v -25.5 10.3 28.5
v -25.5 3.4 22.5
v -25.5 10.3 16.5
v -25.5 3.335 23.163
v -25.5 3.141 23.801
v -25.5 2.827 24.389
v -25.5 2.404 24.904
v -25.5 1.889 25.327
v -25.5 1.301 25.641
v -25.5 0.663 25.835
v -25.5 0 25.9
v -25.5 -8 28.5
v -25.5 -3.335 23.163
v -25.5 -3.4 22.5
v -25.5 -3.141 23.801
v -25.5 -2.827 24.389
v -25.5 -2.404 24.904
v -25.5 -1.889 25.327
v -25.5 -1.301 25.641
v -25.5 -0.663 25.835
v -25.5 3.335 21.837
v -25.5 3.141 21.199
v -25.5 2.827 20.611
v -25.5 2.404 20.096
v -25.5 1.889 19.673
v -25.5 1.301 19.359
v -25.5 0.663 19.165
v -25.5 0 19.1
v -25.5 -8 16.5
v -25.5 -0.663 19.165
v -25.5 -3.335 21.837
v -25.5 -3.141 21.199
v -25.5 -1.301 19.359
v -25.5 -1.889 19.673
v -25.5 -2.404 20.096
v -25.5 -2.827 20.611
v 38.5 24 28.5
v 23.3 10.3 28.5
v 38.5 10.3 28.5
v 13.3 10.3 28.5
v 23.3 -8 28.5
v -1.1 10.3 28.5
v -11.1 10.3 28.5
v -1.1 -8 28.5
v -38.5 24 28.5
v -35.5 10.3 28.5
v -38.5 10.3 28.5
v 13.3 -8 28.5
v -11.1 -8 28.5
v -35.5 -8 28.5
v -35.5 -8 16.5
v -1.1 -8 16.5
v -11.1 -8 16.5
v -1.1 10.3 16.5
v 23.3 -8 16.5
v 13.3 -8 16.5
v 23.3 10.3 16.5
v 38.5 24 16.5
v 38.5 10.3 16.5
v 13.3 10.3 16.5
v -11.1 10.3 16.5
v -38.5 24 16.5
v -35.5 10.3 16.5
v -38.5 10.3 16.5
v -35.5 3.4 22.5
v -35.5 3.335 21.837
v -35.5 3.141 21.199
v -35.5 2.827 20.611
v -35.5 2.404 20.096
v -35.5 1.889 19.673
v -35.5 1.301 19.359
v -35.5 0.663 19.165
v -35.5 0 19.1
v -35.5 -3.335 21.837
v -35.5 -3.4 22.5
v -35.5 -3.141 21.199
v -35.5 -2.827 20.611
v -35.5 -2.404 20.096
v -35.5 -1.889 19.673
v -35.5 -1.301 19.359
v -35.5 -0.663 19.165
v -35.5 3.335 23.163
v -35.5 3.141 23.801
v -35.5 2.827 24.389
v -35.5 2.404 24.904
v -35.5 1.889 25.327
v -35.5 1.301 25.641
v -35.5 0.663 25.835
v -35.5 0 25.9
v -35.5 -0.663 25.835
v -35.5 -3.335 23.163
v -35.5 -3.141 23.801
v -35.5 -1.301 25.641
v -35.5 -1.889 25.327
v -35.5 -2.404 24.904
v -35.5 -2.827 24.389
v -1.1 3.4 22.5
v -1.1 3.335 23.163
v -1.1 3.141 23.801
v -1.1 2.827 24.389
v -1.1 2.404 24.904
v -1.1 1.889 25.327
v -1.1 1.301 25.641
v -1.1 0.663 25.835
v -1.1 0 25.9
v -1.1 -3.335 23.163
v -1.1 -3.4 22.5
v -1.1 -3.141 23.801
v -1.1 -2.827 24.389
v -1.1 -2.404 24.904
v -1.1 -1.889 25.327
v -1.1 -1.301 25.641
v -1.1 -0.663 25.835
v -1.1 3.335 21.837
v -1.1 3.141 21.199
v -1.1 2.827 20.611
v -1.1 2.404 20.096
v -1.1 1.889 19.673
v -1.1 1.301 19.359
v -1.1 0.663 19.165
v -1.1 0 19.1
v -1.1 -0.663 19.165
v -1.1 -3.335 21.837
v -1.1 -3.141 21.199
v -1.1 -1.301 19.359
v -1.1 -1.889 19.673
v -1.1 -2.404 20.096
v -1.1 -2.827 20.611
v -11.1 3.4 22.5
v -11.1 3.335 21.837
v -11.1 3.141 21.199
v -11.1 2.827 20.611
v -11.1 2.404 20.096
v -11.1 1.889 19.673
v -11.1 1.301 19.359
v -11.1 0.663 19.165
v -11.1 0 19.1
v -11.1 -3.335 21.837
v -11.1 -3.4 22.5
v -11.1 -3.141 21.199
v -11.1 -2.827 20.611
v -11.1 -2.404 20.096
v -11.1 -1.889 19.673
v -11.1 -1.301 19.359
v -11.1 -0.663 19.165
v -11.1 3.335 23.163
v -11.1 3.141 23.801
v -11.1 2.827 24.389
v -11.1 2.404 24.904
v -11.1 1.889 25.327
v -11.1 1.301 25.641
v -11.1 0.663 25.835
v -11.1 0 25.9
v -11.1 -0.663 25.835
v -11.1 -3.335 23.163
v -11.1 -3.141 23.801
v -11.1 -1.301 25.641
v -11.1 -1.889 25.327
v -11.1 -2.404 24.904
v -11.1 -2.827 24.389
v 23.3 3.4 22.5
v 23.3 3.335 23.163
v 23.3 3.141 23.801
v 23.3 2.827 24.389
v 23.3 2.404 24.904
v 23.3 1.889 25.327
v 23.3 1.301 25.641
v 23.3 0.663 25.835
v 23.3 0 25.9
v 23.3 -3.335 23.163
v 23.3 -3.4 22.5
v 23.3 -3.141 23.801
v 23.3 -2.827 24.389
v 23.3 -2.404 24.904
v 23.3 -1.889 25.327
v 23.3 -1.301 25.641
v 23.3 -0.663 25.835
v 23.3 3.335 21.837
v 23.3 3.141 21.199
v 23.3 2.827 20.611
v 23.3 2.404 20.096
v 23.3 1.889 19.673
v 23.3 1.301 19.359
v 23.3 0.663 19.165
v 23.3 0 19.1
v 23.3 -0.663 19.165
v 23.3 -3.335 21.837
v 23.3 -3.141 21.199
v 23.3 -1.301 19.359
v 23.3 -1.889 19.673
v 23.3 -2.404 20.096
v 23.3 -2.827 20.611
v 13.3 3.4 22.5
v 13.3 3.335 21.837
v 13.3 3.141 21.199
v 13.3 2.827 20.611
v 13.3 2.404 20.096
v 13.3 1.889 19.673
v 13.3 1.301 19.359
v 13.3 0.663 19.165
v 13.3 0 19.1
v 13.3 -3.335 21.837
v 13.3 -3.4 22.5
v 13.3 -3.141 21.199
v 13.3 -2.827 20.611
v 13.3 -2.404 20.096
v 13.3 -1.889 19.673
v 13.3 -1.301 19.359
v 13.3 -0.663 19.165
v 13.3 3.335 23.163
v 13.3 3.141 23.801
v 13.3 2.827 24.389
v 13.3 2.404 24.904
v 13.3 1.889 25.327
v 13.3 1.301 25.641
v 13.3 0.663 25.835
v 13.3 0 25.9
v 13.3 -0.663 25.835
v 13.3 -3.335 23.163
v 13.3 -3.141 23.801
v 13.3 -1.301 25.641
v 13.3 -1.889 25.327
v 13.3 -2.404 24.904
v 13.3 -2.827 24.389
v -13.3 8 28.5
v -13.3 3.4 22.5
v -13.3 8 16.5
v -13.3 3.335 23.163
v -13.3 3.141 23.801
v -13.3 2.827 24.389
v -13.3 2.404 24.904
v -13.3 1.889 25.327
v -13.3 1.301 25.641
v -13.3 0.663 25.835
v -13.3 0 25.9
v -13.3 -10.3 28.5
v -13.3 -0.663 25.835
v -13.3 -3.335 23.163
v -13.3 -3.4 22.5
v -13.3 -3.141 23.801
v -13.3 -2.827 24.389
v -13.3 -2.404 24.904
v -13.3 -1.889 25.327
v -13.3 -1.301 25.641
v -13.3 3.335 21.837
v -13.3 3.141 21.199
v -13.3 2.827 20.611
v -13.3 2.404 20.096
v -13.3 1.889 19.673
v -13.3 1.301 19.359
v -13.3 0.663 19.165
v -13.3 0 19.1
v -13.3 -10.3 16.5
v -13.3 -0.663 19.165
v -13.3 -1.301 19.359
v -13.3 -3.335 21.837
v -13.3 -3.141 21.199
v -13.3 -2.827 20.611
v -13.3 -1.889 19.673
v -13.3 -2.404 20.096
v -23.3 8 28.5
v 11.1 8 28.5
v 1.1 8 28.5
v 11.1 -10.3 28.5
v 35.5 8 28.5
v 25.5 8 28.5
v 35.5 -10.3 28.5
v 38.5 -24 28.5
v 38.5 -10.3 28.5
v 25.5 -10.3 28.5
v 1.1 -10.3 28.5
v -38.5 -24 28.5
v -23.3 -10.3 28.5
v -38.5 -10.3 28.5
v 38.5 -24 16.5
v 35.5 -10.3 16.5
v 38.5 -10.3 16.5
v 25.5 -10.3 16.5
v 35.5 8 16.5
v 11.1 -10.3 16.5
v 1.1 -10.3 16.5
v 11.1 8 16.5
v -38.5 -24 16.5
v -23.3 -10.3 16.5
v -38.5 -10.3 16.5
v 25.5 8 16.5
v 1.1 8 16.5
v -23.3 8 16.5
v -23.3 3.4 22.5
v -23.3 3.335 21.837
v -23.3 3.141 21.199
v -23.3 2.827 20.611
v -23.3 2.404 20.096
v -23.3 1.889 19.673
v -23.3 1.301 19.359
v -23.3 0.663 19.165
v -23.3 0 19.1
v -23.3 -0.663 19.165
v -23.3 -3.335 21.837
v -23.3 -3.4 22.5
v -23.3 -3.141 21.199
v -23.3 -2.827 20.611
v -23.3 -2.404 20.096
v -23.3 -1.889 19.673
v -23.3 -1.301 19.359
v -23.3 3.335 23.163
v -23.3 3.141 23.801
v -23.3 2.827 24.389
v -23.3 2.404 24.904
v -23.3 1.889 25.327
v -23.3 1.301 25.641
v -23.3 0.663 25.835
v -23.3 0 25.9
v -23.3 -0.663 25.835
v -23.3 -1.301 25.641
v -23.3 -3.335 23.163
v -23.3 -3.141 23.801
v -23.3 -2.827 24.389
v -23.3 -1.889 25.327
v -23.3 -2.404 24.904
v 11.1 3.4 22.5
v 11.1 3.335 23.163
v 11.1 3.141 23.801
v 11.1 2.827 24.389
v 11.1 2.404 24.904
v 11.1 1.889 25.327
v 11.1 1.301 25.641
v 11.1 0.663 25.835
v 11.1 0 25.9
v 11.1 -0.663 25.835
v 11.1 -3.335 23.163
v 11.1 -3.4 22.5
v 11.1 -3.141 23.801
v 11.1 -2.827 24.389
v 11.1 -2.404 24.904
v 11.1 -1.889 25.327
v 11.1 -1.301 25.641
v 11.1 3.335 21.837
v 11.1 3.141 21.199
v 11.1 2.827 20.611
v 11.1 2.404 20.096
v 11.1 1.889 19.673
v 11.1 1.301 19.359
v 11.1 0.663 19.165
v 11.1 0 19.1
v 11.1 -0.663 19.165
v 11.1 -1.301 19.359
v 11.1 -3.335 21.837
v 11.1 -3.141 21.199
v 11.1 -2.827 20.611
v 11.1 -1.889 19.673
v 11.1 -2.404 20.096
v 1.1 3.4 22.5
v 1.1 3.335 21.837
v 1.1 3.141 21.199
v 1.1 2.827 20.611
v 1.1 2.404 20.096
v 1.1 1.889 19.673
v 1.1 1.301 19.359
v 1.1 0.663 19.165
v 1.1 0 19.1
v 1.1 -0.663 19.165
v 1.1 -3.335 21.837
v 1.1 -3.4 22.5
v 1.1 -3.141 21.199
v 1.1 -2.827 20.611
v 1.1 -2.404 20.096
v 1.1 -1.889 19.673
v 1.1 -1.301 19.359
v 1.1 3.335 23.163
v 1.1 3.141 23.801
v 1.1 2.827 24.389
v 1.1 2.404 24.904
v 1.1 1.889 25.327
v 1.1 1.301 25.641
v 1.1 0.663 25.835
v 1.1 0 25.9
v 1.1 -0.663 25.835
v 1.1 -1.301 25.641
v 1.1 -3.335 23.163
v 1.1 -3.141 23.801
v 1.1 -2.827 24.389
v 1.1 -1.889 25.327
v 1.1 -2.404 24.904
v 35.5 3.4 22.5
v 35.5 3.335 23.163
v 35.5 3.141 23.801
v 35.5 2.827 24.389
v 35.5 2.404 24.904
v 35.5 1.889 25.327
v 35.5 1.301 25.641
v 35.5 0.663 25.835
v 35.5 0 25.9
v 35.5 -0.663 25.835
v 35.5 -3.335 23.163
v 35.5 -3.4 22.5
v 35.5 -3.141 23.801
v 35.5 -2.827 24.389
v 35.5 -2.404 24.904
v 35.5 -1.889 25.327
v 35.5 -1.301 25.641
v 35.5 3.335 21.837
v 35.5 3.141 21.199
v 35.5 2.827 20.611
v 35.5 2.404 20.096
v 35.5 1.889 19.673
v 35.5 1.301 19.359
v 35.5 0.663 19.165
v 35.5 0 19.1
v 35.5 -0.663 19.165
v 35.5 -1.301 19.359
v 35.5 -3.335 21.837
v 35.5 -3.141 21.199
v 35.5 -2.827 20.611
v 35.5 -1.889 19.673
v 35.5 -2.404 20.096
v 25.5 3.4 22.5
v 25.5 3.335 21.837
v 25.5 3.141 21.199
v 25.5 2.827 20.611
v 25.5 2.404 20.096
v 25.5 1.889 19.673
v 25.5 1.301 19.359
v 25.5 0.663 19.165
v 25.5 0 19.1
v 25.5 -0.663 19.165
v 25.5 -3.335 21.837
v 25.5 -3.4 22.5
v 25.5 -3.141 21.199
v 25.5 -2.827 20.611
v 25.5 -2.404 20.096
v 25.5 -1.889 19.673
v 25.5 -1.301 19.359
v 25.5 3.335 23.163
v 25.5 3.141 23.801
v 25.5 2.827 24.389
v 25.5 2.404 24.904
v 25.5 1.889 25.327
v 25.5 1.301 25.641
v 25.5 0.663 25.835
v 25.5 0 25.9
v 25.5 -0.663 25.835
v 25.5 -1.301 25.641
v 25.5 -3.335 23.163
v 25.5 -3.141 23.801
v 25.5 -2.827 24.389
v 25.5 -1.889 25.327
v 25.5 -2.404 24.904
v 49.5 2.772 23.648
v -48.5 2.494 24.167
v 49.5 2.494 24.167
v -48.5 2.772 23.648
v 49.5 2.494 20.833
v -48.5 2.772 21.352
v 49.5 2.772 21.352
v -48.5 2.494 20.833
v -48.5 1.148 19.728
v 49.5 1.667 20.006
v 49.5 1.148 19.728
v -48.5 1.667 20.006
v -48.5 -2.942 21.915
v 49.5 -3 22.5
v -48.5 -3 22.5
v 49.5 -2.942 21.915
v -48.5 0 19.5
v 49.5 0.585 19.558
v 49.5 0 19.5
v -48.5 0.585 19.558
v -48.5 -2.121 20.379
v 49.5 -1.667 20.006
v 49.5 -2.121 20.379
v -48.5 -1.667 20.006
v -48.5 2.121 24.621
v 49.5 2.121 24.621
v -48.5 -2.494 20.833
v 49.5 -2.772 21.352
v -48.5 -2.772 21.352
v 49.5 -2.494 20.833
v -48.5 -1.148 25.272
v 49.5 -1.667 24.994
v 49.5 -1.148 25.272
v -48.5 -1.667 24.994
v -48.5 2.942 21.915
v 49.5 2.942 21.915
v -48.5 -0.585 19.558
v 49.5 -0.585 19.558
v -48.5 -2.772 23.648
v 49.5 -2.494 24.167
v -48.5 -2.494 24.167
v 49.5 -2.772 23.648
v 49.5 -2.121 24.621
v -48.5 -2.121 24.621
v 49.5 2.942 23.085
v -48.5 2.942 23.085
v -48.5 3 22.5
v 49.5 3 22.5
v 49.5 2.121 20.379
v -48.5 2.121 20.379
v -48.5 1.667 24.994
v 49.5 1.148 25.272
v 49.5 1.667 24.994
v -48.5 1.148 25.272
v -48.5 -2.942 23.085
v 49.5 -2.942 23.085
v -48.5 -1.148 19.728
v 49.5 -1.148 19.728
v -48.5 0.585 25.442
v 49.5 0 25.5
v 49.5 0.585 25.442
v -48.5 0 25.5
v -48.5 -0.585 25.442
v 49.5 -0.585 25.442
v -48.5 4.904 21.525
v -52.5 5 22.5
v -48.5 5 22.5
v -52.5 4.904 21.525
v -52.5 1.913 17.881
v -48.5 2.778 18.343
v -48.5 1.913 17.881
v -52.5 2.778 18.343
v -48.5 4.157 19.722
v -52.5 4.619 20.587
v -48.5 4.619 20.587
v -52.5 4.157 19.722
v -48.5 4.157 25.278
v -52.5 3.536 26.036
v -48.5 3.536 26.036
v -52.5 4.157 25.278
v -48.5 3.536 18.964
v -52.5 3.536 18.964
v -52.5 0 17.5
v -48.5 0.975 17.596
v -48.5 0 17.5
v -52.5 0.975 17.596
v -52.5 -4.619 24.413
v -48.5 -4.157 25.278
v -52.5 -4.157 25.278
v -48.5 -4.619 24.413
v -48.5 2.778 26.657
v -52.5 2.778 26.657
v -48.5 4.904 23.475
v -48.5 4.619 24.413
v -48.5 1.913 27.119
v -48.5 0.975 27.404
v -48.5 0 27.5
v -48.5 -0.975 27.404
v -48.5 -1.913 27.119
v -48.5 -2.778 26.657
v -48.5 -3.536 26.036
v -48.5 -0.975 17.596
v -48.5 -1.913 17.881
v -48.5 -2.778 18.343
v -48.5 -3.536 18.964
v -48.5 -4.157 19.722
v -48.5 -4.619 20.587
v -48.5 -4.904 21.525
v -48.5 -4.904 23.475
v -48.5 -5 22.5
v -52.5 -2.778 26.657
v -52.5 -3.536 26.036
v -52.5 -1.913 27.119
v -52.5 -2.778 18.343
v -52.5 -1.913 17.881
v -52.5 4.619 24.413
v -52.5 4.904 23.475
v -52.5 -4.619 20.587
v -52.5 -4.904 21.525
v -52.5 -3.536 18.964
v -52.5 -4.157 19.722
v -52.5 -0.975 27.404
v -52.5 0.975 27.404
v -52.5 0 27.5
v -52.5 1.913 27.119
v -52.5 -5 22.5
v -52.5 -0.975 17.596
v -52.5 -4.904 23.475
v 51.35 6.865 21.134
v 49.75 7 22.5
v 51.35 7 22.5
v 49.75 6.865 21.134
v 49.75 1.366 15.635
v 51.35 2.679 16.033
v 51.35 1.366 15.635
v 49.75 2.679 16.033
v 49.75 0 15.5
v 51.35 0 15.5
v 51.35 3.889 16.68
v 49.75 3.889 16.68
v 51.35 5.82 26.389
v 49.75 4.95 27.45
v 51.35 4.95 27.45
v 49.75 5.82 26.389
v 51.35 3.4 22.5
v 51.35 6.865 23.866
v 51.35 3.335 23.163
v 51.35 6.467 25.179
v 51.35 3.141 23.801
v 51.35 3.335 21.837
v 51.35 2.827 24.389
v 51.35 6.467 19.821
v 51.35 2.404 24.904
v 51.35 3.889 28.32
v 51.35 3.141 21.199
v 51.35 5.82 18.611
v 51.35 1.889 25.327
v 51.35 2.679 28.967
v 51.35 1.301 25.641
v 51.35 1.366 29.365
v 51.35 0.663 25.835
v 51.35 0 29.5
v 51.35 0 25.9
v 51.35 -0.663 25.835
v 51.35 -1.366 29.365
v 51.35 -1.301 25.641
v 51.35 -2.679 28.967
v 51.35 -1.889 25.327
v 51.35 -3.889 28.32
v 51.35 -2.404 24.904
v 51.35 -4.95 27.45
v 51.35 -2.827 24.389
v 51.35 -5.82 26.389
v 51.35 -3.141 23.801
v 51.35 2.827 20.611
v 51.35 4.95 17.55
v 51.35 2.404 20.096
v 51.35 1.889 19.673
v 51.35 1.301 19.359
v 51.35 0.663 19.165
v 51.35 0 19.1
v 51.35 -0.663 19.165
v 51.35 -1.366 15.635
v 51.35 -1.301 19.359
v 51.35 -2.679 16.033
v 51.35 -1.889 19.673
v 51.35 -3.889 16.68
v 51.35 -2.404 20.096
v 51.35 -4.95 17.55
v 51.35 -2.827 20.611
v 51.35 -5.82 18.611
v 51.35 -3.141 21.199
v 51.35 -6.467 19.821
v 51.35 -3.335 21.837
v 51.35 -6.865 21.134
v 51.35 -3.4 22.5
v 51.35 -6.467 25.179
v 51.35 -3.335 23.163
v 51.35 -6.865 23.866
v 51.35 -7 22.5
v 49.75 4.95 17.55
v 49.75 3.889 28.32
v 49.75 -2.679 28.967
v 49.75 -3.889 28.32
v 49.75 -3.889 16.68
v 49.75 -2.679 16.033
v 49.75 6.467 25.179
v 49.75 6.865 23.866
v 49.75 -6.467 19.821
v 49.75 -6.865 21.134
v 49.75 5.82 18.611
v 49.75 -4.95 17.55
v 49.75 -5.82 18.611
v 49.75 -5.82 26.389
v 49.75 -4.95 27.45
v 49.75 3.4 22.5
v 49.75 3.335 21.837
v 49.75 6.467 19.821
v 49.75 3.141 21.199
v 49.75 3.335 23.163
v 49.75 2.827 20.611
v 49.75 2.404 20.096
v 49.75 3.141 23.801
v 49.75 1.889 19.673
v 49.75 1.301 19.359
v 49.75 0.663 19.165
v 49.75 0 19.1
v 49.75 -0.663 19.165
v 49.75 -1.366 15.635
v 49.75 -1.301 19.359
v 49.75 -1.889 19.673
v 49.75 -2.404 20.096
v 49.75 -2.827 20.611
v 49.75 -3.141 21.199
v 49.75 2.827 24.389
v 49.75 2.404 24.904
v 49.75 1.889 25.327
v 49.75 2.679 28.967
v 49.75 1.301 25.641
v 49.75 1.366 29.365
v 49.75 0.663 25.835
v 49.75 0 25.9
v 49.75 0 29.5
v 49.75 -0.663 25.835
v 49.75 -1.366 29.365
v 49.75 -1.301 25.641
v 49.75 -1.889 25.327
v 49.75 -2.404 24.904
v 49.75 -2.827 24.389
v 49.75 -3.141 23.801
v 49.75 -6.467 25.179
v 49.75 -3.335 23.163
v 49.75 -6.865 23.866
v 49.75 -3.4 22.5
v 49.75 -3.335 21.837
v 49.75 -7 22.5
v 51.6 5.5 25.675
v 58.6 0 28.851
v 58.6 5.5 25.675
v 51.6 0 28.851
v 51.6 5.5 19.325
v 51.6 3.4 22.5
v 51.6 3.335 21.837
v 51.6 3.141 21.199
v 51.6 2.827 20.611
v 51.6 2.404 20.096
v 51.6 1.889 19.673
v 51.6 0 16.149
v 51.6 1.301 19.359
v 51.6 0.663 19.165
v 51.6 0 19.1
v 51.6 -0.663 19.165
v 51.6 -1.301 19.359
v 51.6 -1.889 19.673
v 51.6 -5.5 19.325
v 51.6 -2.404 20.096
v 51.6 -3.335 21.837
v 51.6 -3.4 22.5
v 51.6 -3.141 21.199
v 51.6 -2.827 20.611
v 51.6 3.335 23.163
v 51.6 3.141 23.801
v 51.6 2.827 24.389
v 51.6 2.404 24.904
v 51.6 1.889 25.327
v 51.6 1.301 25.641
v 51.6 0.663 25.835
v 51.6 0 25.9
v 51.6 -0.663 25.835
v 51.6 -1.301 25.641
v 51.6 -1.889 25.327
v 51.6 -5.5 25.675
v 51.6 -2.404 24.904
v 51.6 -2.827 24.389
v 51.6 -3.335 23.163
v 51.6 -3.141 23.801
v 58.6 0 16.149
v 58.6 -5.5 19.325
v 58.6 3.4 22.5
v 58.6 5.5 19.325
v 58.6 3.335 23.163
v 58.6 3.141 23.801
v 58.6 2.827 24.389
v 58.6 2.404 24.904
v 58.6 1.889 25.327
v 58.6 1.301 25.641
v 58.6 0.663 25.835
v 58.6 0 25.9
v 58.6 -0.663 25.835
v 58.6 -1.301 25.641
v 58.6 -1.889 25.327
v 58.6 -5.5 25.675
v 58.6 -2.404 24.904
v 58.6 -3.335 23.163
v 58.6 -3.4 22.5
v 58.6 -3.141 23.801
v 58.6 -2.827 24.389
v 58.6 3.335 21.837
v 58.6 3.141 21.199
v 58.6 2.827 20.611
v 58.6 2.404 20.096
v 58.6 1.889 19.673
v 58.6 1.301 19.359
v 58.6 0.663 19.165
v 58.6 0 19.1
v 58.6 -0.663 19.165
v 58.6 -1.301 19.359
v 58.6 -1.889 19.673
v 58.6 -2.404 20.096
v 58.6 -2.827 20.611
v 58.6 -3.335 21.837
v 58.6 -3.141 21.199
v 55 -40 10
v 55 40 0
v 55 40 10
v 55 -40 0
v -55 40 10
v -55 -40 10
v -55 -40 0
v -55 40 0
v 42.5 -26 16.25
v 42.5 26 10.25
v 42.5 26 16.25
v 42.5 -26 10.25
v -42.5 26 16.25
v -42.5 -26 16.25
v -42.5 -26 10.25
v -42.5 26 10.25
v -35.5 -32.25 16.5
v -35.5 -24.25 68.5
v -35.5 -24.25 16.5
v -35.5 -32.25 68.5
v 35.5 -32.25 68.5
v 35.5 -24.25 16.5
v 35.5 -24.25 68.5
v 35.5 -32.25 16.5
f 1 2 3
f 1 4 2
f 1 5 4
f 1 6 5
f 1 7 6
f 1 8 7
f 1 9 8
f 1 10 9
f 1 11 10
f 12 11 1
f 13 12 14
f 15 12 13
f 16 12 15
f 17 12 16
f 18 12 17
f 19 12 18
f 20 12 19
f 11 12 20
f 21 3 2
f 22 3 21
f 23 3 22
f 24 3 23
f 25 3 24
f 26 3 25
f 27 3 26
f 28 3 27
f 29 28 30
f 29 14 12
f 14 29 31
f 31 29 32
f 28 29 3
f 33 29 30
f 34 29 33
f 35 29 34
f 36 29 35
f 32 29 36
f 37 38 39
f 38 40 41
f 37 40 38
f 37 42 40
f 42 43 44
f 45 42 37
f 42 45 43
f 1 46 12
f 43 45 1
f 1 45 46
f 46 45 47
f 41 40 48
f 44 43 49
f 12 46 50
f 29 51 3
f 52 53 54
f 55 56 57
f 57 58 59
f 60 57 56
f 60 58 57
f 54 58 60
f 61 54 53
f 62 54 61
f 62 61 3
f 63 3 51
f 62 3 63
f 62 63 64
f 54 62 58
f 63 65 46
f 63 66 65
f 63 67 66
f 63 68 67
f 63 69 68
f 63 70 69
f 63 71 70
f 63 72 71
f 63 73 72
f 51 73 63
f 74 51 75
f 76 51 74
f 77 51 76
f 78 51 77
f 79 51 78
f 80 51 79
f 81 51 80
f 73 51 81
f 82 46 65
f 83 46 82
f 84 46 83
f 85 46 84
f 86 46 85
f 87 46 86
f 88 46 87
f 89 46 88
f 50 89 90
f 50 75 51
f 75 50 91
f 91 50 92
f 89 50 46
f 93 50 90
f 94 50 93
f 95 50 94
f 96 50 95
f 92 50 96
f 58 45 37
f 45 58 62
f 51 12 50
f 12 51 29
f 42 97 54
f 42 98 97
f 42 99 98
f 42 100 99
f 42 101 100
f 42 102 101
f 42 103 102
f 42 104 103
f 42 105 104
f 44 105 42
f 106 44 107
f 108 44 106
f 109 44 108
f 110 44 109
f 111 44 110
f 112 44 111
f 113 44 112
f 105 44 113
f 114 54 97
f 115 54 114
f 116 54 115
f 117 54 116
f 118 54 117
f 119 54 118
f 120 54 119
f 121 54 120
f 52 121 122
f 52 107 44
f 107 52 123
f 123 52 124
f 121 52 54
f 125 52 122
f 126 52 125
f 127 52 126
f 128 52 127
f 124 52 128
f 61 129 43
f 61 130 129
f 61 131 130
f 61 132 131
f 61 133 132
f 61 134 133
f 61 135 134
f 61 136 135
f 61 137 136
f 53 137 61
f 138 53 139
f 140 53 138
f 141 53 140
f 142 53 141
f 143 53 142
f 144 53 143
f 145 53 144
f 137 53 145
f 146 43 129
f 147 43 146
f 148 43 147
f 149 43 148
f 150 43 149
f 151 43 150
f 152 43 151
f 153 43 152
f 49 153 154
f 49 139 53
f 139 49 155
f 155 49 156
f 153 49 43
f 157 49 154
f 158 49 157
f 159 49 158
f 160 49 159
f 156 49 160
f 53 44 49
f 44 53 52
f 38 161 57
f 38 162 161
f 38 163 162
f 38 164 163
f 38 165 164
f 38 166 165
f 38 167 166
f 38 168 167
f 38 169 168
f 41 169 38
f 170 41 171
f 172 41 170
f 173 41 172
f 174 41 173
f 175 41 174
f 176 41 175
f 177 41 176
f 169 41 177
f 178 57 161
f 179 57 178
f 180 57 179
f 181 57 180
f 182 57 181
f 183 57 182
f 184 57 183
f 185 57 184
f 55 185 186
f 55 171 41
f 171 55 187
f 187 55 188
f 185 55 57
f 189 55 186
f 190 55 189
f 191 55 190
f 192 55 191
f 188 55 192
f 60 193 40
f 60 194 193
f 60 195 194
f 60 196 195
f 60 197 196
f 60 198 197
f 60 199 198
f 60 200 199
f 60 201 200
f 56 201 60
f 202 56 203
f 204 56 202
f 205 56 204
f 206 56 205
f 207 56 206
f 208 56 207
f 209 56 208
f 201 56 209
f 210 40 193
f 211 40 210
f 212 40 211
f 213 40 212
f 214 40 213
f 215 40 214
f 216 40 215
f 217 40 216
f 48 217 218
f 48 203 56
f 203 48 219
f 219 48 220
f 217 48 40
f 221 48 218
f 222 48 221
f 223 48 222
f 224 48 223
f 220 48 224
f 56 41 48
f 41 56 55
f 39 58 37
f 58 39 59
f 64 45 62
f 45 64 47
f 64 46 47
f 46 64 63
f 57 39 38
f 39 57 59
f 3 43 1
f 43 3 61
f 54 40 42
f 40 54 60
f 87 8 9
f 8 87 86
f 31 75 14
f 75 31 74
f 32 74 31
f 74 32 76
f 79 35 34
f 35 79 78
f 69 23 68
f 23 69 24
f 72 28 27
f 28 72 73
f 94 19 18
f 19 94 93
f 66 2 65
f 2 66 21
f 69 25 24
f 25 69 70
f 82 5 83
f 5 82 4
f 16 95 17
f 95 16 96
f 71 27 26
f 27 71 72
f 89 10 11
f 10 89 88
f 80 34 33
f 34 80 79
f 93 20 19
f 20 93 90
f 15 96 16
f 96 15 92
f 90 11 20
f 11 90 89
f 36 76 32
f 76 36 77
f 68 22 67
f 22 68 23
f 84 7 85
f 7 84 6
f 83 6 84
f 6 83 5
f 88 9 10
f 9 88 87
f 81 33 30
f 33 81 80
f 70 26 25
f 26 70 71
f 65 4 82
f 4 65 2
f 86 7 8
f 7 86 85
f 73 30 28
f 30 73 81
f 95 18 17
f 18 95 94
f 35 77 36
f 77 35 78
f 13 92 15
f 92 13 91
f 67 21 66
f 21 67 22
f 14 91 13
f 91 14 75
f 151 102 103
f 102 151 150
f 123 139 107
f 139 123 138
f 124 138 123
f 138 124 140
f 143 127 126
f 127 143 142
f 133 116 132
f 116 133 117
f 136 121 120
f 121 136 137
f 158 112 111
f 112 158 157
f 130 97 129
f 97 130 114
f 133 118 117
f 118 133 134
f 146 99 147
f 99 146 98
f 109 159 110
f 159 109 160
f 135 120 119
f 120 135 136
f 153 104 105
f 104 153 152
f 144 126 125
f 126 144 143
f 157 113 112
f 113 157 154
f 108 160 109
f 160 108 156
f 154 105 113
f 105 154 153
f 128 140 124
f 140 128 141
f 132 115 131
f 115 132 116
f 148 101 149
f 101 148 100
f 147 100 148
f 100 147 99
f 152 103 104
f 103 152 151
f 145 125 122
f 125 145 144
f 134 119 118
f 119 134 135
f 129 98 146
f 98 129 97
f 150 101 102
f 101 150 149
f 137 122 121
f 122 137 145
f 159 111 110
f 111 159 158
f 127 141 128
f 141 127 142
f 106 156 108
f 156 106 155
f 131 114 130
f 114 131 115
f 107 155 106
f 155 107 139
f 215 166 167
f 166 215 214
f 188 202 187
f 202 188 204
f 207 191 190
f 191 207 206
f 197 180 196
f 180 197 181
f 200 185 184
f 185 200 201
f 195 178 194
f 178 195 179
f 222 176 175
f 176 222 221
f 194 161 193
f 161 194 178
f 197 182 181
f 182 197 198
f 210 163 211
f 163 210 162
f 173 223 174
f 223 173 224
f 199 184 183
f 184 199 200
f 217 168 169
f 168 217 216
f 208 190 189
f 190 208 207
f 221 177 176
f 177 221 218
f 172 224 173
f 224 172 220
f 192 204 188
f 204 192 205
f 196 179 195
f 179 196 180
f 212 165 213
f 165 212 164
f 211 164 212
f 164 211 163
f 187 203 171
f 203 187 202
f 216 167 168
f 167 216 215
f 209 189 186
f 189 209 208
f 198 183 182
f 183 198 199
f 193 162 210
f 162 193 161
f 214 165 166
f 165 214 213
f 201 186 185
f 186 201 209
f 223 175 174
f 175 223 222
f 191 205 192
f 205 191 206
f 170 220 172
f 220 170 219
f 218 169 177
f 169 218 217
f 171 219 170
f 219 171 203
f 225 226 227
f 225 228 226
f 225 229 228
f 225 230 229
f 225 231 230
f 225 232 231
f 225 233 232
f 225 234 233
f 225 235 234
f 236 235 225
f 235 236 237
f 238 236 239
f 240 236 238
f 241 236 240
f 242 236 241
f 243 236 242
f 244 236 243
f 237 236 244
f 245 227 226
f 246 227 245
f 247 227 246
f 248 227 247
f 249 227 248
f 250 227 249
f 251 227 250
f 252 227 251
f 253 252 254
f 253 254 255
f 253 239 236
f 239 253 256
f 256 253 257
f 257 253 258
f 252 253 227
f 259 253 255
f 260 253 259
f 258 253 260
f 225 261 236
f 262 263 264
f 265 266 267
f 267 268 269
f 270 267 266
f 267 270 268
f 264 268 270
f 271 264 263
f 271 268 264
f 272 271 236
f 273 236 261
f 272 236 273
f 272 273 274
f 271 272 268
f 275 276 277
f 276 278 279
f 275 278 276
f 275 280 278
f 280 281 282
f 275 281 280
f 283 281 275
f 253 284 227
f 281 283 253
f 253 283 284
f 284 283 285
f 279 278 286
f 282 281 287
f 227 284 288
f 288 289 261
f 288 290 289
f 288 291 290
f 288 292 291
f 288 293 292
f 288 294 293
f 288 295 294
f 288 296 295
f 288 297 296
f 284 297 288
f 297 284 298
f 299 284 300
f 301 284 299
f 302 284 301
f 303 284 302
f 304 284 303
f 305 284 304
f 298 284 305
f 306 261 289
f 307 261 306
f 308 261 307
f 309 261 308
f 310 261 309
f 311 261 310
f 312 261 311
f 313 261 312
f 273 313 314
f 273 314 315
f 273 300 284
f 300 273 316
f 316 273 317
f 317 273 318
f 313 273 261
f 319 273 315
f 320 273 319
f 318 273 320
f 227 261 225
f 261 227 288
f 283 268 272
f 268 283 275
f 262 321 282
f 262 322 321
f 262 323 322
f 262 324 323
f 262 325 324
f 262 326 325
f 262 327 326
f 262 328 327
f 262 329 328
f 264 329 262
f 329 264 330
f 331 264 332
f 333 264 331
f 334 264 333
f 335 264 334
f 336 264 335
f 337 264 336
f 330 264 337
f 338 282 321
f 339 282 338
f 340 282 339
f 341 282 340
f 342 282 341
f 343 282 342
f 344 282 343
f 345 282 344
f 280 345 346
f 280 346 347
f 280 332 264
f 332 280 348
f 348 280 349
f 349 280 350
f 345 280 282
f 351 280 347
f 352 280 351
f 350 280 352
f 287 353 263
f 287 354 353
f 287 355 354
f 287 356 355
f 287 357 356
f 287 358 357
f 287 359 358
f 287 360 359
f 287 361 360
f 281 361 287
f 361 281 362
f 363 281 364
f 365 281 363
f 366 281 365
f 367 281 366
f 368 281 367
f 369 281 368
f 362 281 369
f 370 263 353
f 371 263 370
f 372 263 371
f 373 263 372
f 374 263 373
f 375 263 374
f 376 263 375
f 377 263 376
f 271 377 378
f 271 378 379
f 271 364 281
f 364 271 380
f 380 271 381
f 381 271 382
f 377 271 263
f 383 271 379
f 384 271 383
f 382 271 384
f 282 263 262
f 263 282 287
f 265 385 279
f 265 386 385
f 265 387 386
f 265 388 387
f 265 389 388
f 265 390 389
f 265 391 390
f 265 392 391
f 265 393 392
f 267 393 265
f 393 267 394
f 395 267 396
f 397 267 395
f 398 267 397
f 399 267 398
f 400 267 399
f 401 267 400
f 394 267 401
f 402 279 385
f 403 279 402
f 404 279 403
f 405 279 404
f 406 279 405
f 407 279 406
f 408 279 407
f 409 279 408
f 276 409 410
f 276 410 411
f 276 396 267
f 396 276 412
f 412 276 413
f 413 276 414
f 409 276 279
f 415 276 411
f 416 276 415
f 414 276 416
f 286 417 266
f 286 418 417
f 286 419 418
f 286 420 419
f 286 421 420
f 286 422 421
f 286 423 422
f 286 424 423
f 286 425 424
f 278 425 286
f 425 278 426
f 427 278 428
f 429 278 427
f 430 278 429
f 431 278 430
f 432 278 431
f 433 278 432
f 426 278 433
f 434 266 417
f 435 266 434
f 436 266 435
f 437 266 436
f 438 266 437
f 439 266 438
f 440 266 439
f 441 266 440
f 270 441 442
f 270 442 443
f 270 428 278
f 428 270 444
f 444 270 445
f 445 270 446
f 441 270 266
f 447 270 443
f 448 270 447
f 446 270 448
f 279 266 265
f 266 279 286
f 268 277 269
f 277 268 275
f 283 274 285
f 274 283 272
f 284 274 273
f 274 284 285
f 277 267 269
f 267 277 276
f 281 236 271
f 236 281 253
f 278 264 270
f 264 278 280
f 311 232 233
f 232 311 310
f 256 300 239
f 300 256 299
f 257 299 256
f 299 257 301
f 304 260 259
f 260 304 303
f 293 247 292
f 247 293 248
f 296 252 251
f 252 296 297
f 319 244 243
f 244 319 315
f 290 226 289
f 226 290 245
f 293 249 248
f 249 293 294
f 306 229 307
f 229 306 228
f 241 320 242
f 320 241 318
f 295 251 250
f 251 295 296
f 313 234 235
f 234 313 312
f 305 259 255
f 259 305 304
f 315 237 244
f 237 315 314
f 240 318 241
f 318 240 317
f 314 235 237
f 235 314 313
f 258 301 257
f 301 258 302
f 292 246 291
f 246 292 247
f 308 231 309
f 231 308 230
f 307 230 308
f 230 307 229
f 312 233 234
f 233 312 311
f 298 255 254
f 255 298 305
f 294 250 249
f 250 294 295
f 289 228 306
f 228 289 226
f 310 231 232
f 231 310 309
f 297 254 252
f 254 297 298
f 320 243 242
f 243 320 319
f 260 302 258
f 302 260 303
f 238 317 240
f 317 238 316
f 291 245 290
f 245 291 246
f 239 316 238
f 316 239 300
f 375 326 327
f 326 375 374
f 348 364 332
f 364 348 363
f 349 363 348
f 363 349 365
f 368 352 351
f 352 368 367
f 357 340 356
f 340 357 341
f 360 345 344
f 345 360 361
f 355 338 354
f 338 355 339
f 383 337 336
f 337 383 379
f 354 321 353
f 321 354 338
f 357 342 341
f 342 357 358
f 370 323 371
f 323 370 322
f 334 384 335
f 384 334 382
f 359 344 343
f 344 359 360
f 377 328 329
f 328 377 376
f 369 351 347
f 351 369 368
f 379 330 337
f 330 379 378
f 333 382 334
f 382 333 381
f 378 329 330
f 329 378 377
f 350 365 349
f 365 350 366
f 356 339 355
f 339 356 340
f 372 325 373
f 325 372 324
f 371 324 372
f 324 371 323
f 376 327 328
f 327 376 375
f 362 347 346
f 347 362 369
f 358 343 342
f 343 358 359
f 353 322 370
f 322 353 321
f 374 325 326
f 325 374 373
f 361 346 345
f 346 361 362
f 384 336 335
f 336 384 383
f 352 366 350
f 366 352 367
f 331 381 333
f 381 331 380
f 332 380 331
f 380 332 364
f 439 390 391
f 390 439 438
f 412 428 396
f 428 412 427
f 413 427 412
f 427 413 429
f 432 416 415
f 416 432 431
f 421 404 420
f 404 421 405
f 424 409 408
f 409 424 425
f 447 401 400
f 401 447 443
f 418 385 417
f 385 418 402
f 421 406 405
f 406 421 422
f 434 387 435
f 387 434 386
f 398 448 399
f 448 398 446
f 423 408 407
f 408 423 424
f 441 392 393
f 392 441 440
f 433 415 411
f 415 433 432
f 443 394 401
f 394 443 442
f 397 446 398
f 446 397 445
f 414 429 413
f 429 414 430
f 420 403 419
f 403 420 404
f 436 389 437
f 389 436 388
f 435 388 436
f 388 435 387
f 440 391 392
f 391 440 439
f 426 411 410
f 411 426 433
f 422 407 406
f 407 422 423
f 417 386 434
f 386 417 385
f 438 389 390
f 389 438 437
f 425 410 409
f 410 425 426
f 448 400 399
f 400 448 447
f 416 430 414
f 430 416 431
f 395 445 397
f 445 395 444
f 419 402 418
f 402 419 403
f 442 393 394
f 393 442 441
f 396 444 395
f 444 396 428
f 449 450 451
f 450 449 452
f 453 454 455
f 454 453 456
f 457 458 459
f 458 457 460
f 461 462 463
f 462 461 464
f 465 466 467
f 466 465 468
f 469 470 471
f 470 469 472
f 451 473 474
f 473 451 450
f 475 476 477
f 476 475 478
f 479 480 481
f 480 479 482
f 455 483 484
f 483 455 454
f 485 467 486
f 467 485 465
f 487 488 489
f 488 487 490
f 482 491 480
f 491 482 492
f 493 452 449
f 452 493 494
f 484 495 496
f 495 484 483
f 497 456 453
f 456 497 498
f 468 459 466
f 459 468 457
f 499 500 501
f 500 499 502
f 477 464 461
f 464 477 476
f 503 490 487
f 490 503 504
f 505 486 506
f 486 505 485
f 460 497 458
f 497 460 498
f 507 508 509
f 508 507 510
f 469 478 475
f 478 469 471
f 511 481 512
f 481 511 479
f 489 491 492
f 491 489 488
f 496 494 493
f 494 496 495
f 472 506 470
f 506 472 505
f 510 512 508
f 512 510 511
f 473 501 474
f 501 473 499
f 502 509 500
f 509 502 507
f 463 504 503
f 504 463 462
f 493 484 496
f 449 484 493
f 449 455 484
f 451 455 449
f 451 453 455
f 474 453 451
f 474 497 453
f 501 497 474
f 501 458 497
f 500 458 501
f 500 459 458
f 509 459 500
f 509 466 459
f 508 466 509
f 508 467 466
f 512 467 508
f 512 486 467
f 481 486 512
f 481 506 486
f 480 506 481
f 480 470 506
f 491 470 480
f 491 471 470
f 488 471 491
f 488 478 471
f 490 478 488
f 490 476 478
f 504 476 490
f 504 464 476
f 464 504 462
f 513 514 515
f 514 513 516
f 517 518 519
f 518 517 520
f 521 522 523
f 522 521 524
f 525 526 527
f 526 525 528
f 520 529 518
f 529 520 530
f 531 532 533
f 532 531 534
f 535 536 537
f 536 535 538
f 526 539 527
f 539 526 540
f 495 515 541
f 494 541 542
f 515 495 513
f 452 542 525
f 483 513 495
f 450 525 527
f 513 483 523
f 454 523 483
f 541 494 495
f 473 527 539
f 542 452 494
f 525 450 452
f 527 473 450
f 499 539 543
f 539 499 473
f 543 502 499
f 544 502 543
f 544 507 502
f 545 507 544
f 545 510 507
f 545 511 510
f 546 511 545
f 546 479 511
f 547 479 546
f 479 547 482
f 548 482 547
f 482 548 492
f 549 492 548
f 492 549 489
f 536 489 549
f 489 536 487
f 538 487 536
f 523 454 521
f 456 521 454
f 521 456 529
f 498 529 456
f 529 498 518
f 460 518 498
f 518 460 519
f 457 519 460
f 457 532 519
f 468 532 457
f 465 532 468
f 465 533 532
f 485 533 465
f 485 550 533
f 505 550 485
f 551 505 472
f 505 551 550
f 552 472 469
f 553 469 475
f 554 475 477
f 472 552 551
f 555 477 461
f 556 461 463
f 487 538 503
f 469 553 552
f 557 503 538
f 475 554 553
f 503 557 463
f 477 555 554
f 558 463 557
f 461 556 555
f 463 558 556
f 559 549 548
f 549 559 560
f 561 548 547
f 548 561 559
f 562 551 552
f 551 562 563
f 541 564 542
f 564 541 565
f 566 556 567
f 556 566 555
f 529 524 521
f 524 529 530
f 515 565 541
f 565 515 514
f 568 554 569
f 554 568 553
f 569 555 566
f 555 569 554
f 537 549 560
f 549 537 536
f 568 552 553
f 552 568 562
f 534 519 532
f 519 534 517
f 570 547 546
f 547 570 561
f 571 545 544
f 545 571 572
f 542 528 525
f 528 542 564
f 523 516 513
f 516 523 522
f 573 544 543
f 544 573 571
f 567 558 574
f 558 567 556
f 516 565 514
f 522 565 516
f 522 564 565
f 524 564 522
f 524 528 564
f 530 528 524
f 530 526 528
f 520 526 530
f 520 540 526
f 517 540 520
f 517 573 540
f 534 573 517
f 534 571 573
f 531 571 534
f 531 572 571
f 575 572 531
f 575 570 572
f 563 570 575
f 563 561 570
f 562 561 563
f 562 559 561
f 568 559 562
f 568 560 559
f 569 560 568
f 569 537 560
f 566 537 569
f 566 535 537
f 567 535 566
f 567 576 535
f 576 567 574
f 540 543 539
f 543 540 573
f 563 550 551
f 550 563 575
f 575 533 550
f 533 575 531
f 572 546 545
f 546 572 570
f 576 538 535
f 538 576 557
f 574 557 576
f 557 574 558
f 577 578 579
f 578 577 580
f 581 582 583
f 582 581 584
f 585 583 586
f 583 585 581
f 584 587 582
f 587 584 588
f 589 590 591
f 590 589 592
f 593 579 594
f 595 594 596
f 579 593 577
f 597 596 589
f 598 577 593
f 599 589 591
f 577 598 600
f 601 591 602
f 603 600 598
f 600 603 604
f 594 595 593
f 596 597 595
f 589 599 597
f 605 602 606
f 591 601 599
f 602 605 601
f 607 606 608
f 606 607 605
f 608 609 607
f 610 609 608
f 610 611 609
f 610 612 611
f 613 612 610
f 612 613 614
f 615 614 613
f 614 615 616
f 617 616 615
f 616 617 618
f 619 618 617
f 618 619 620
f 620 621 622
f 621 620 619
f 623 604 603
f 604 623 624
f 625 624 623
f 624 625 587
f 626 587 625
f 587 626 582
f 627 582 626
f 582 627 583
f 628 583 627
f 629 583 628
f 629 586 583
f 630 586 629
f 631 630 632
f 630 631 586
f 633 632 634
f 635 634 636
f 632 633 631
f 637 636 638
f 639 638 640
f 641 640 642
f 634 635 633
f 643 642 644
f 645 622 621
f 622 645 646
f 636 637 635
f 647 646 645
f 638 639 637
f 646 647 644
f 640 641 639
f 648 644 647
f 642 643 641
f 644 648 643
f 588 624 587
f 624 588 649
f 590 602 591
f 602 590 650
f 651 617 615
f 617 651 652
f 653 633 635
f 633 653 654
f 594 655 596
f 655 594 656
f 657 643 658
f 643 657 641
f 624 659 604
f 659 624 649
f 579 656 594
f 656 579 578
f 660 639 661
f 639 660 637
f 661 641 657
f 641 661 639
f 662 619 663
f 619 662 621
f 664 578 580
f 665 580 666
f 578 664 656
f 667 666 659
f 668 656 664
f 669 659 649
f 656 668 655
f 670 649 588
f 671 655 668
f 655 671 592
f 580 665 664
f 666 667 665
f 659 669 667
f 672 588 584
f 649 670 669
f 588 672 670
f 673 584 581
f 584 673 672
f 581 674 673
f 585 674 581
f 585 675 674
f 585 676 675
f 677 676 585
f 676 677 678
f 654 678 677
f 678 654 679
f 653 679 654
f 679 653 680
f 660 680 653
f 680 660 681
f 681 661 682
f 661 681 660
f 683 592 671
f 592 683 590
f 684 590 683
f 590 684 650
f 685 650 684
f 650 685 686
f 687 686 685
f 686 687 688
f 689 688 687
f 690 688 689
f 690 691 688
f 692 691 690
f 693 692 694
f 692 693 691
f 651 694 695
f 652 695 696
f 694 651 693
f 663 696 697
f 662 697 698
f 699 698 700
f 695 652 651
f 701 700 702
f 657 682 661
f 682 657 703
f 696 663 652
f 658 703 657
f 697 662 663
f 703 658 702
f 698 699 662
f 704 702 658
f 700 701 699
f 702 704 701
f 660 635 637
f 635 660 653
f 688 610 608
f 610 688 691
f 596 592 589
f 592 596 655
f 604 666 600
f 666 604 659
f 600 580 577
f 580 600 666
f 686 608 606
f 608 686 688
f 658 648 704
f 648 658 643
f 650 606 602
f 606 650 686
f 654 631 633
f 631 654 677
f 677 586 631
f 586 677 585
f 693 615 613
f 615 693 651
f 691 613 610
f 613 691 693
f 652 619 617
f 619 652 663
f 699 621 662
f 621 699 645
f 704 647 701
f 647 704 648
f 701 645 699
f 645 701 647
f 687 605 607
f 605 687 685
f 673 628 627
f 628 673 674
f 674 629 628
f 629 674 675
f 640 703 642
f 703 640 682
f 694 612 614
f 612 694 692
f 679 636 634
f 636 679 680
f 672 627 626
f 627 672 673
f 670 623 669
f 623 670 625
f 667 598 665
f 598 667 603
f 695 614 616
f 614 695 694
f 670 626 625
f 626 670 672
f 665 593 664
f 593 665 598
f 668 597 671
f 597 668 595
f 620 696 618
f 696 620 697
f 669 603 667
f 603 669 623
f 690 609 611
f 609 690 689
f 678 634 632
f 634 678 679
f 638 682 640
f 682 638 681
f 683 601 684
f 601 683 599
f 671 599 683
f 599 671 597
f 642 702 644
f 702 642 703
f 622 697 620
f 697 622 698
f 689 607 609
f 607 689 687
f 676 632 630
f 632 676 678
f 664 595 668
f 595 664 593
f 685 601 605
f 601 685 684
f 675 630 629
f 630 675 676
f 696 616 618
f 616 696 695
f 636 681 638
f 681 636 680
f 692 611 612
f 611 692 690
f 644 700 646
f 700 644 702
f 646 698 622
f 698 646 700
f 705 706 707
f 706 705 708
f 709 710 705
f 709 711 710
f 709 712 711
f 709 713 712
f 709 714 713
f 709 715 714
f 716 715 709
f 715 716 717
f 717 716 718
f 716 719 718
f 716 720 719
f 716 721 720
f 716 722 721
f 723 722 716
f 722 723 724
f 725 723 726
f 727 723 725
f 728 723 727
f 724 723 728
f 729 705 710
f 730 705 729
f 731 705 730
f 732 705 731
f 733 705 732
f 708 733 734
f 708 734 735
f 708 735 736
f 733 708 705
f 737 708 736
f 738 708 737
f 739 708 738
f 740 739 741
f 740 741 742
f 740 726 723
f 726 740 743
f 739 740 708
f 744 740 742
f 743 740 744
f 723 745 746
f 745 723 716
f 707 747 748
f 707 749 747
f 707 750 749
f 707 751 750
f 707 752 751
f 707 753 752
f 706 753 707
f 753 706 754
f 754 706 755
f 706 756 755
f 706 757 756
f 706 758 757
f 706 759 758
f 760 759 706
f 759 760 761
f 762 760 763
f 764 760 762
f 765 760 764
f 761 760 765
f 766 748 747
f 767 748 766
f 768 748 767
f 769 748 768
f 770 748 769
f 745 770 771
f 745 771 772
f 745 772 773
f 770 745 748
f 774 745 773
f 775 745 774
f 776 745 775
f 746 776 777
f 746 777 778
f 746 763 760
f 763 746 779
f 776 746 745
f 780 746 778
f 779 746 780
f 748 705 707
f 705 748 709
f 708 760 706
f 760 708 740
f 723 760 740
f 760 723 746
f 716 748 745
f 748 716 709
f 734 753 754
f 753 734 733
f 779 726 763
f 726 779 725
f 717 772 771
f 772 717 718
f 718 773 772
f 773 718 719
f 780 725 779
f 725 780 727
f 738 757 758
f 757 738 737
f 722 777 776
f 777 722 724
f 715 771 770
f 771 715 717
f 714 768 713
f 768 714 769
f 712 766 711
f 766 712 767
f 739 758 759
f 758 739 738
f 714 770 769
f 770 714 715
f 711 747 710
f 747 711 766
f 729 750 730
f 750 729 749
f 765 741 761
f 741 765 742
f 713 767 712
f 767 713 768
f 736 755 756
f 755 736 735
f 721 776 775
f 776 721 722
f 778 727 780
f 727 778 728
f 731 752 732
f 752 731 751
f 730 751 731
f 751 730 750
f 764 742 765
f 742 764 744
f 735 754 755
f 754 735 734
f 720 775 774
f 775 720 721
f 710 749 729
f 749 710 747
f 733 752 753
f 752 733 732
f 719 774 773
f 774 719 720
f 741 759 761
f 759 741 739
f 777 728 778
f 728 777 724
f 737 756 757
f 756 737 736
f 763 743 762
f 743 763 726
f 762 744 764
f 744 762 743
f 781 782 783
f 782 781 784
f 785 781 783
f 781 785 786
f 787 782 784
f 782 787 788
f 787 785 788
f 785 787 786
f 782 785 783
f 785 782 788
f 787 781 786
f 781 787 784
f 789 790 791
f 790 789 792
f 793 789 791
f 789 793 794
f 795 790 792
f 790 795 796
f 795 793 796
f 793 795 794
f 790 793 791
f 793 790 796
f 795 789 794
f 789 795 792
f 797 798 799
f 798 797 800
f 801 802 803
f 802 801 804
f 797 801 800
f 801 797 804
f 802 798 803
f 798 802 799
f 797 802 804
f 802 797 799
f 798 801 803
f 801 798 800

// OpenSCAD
$fn = 32;

// ------------------------------------------------------------------------
// Comb hinge with flap: leaf 77 x 24 mm, pin d6, flap 52 mm
// Every part is its own module, assembly() places every instance.
// ------------------------------------------------------------------------

// --- part 1 ---
module hinge_bed() {
  difference() {
    translate([-55, -40, 0]) cube([110, 80, 10]);
  }
}

// --- part 2 ---
module hinge_riser() {
  difference() {
    translate([-42.5, -26, 0]) cube([85, 52, 6]);
  }
}

// --- part 3 ---
module hinge_leaf_a() {
  difference() {
    union() {
      translate([-35.5, -8, -6]) cube([10, 32, 12]);
      translate([-11.1, -8, -6]) cube([10, 32, 12]);
      translate([13.3, -8, -6]) cube([10, 32, 12]);
      translate([-38.5, 10.3, -6]) cube([77, 13.7, 12]);
    }
    translate([-30.5, 0, 0]) rotate([0, 90, 0]) cylinder(h = 12, d = 6.8, center = true);
    translate([-6.1, 0, 0]) rotate([0, 90, 0]) cylinder(h = 12, d = 6.8, center = true);
    translate([18.3, 0, 0]) rotate([0, 90, 0]) cylinder(h = 12, d = 6.8, center = true);
  }
}

// --- part 4 ---
module hinge_leaf_b() {
  difference() {
    union() {
      translate([-23.3, -24, -6]) cube([10, 32, 12]);
      translate([1.1, -24, -6]) cube([10, 32, 12]);
      translate([25.5, -24, -6]) cube([10, 32, 12]);
      translate([-38.5, -24, -6]) cube([77, 13.7, 12]);
    }
    translate([-18.3, 0, 0]) rotate([0, 90, 0]) cylinder(h = 12, d = 6.8, center = true);
    translate([6.1, 0, 0]) rotate([0, 90, 0]) cylinder(h = 12, d = 6.8, center = true);
    translate([30.5, 0, 0]) rotate([0, 90, 0]) cylinder(h = 12, d = 6.8, center = true);
  }
}

// --- part 5 ---
module hinge_flap() {
  difference() {
    translate([-35.5, -26, 0]) cube([71, 52, 8]);
  }
}

// --- part 6 ---
module hinge_pin() {
  rotate([0, 90, 0]) cylinder(h = 99, d = 6, center = true);
  translate([-52.5, 0, 0]) rotate([0, 90, 0]) cylinder(h = 4, d = 10);
}

// --- part 7 ---
module pin_washer() {
  difference() {
      translate([0, 0, 0]) cylinder(h = 1.6, d = 14);
      translate([0, 0, -1]) cylinder(h = 3.6, d = 6.8);
    }
}

// --- part 8 ---
module pin_nut() {
  difference() {
    linear_extrude(height = 7) polygon(points = [[6.351, 0], [3.175, 5.5], [-3.175, 5.5], [-6.351, 0], [-3.175, -5.5], [3.175, -5.5]]);
    translate([0, 0, -1]) cylinder(h = 9, d = 6.8);
  }
}

// --- assembly ---
module assembly() {
  color([0.80, 0.24, 0.20]) translate([0, 0, 0]) rotate([0, 0, 0]) hinge_bed();
  color([0.20, 0.45, 0.75]) translate([0, 0, 10.25]) rotate([0, 0, 0]) hinge_riser();
  color([0.25, 0.62, 0.32]) translate([0, 0, 22.5]) rotate([0, 0, 0]) hinge_leaf_a();
  color([0.92, 0.70, 0.18]) translate([0, 0, 22.5]) rotate([0, 0, 0]) hinge_leaf_b();
  color([0.58, 0.35, 0.70]) translate([0, -24.25, 42.5]) rotate([90, 0, 0]) hinge_flap();
  color([0.16, 0.66, 0.66]) translate([0, 0, 22.5]) rotate([0, 0, 0]) hinge_pin();
  color([0.85, 0.48, 0.18]) translate([49.75, 0, 22.5]) rotate([0, 90, 0]) pin_washer();
  color([0.55, 0.60, 0.65]) translate([51.6, 0, 22.5]) rotate([0, 90, 0]) pin_nut();
}

assembly();
